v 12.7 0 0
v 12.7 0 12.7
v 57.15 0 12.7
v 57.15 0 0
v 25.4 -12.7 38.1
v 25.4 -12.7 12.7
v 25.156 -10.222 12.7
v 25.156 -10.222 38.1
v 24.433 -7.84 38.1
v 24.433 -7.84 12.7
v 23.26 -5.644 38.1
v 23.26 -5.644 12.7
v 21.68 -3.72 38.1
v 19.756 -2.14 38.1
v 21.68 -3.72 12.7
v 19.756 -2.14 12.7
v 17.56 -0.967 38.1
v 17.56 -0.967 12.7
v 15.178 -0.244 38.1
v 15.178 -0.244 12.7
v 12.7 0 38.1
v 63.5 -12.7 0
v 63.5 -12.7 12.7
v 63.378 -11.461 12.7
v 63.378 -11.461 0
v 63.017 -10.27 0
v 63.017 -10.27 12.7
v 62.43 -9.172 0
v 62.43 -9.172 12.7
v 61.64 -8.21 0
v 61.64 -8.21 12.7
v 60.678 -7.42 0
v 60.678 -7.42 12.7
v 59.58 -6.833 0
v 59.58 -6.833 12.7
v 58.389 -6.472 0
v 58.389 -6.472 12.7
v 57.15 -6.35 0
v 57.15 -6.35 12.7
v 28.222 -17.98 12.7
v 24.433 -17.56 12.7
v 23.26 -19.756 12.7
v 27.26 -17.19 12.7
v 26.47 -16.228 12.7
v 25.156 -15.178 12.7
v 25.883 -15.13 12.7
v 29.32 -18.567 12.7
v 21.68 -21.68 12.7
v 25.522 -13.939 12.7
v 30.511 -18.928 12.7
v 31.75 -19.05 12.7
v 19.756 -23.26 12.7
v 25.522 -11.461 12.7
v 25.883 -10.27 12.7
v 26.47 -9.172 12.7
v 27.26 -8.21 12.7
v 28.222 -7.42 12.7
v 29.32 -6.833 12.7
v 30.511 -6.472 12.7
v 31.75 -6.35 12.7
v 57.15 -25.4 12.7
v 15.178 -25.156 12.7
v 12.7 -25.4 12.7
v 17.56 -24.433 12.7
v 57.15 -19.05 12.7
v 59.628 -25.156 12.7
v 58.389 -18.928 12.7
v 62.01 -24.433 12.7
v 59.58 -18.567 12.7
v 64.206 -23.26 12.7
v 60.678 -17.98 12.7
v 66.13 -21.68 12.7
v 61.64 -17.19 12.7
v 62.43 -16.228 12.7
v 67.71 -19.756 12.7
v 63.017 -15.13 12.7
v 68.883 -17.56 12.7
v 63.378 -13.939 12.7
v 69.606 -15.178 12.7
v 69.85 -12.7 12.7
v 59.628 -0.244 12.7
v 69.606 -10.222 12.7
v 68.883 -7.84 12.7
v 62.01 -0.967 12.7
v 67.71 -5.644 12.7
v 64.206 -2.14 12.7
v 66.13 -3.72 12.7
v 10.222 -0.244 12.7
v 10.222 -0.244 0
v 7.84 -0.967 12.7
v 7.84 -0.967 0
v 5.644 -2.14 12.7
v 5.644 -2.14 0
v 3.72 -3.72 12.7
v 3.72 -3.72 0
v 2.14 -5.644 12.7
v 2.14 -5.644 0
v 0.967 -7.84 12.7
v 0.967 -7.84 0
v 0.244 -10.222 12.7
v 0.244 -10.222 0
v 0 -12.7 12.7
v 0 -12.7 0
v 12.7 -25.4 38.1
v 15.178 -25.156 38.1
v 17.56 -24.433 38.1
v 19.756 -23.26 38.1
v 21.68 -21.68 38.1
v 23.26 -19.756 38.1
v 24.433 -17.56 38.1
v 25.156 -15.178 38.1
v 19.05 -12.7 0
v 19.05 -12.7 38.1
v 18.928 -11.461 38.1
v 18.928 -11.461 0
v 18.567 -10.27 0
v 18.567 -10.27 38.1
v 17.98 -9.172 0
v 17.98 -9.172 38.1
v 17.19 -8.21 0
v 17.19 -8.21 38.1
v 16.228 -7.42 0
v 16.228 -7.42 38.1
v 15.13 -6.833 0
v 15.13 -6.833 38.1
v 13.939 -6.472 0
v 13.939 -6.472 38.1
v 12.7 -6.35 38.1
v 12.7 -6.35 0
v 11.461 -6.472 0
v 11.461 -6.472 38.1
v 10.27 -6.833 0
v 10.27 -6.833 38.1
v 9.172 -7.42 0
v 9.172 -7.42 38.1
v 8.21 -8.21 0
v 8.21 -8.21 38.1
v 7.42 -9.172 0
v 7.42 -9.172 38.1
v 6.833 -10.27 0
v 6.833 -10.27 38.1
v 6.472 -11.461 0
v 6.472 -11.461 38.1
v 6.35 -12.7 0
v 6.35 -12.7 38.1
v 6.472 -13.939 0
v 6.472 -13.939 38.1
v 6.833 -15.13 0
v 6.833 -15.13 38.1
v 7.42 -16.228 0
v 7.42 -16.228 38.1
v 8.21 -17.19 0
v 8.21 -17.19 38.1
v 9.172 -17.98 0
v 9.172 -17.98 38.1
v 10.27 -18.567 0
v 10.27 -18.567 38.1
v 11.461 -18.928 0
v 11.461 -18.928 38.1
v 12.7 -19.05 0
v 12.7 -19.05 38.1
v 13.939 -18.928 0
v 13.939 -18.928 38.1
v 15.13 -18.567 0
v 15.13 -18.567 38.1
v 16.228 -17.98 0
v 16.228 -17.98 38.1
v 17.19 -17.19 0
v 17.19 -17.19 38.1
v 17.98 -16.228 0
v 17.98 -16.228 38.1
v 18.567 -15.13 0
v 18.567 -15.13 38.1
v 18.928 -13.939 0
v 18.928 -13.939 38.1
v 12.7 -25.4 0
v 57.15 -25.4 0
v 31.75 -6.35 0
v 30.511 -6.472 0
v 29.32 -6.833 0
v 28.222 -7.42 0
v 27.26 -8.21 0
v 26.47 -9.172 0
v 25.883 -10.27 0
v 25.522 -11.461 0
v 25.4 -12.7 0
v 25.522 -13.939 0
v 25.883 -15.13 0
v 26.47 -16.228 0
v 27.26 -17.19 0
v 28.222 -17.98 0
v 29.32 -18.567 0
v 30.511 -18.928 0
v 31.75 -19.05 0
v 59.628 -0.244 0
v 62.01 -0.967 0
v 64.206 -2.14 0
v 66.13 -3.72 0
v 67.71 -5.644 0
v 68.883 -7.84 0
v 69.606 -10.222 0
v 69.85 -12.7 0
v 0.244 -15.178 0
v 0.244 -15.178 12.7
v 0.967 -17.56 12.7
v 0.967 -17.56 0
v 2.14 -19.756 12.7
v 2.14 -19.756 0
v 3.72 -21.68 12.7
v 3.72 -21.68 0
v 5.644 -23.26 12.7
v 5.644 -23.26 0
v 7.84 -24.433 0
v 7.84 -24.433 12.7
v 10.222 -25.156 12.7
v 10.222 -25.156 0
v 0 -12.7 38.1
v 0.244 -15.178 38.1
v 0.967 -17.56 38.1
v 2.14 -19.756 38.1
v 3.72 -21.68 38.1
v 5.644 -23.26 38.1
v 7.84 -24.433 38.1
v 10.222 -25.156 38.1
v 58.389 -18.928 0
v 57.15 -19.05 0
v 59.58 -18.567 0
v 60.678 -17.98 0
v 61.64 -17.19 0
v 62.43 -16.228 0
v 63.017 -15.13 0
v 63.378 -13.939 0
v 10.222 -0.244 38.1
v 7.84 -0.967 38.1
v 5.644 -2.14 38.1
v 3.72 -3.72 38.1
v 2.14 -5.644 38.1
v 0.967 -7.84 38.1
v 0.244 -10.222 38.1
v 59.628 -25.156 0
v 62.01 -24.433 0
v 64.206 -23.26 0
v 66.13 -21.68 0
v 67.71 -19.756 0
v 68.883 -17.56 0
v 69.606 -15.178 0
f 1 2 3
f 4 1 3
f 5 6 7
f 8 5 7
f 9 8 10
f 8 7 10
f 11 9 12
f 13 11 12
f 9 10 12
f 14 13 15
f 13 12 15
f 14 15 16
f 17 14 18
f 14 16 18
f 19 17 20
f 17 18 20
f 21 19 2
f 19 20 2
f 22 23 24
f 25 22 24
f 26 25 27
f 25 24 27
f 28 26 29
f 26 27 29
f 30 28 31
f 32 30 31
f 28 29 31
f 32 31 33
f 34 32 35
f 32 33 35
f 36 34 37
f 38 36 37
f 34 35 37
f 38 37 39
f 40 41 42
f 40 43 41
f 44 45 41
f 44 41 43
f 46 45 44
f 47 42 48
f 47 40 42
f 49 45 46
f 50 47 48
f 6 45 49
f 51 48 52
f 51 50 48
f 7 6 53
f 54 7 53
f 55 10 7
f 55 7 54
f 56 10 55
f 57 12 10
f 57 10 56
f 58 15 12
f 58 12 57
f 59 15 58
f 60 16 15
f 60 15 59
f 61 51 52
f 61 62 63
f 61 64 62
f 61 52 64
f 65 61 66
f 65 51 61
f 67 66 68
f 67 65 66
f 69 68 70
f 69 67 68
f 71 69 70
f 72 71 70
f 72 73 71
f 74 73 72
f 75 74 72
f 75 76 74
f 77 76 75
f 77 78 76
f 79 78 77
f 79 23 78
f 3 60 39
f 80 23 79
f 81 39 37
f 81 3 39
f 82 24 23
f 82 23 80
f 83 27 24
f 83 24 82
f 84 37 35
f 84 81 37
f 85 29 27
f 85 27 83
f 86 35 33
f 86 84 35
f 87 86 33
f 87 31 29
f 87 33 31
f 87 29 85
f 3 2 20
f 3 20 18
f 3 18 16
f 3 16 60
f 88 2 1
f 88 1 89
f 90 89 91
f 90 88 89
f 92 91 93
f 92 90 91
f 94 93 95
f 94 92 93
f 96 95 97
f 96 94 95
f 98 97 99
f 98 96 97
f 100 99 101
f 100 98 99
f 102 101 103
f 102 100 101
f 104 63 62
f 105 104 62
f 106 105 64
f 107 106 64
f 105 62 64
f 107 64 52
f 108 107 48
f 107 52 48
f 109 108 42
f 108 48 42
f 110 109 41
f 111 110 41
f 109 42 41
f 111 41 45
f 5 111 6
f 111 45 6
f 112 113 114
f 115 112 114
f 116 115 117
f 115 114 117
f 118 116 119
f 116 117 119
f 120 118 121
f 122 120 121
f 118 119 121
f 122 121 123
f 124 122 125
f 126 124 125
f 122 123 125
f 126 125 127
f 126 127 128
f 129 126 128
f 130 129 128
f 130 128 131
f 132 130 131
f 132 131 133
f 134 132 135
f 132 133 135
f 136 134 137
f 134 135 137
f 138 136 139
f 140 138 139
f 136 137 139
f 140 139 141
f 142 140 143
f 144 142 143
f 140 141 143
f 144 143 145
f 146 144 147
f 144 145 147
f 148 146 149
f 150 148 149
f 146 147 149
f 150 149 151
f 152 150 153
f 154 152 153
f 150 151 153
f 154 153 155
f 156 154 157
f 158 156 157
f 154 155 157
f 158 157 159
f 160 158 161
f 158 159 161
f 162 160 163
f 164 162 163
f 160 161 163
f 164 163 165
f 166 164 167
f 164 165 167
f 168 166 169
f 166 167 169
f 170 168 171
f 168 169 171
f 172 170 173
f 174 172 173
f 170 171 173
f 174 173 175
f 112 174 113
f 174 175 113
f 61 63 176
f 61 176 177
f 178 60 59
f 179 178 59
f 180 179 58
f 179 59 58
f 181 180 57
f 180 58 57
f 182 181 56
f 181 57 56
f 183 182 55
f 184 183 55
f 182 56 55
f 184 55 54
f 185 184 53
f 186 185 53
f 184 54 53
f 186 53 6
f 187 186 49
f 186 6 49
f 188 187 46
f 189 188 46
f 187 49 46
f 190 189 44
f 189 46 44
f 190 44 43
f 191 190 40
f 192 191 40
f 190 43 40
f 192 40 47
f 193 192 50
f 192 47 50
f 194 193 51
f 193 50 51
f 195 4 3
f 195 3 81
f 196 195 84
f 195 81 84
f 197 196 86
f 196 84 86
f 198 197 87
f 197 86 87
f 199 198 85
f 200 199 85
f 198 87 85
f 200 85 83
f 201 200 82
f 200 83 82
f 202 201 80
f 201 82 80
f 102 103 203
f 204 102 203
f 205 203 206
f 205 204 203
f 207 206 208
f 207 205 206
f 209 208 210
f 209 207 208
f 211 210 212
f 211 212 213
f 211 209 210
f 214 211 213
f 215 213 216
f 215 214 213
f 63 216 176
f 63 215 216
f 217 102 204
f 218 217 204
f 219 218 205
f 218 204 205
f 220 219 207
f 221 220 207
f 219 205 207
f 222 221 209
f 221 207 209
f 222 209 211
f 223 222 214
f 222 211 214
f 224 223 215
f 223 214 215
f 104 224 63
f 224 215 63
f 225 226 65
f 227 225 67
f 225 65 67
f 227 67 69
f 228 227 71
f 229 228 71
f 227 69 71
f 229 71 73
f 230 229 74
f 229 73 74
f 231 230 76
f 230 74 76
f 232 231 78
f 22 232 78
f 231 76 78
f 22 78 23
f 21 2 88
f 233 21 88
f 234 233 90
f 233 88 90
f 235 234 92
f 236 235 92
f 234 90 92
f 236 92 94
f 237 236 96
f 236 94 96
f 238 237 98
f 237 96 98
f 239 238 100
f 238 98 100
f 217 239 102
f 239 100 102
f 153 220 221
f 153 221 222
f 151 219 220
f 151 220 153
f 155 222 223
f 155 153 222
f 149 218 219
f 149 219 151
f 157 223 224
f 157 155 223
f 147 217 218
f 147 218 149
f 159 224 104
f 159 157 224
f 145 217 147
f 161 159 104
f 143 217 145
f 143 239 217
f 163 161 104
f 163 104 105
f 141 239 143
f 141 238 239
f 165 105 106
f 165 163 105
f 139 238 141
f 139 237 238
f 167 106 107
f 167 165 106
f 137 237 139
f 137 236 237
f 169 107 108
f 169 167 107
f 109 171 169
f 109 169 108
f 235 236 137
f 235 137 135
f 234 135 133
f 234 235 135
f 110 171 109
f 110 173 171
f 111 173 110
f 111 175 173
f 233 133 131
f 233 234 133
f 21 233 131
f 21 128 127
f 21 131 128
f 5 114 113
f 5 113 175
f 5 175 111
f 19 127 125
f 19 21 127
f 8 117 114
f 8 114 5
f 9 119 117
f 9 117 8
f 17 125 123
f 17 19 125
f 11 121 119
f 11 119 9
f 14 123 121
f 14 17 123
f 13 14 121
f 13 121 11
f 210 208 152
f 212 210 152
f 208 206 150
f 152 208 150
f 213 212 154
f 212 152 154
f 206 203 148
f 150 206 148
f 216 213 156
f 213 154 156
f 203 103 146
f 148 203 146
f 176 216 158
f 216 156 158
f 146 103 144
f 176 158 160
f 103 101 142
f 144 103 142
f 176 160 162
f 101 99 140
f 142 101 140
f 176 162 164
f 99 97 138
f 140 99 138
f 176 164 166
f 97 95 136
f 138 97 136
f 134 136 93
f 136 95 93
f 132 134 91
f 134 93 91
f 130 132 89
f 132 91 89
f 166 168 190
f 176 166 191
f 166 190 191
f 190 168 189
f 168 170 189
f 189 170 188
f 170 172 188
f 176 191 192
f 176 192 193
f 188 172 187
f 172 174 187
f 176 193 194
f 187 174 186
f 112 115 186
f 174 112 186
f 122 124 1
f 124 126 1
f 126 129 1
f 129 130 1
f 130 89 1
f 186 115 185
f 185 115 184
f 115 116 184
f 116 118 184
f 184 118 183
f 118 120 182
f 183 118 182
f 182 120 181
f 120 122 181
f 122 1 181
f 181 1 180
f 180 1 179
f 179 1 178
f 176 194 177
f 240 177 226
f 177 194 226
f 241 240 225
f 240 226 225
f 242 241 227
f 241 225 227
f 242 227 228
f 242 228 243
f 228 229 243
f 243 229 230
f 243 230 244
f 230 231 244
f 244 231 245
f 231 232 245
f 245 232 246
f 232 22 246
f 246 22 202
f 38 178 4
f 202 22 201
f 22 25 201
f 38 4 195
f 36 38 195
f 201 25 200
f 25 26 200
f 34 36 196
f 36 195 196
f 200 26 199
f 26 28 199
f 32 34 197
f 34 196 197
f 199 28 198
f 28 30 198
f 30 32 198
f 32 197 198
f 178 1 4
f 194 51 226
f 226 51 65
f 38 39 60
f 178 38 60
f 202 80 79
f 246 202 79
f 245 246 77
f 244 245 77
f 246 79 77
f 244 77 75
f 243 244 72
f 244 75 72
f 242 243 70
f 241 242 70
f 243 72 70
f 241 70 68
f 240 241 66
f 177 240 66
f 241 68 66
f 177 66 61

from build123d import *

# Parameters (mm, degrees)
F0_W      = 69.85
F0_H      = 12.7
F1_DEPTH  = 25.4
F3_DEPTH  = 12.7
F5_DEPTH  = 25.4
F6_DEPTH  = 12.7
F7_R      = 6.35
F8_DEPTH  = 38.1
F10_DEPTH = 12.7


with BuildPart() as f1:
    # F0 (on Front) → F1 (new body)
    with BuildSketch(Plane.XZ):
        with Locations((34.925, 6.35)):
            Rectangle(F0_W, F0_H)
    extrude(amount=F1_DEPTH)

    # F2 (on face) → F3 (cut)
    with BuildSketch(Plane.XY.offset(12.7)):
        with BuildLine():
            ThreePointArc((38.1, -12.7), (36.2401280605, -8.2098719395), (31.75, -6.35))
            ThreePointArc((31.75, -6.35), (25.4, -12.7), (31.75, -19.05))
            ThreePointArc((31.75, -19.05), (36.2401280605, -17.1901280605), (38.1, -12.7))
        make_face()
        with BuildLine():
            ThreePointArc((57.15, -19.05), (50.8, -12.7), (57.15, -6.35))
            Line((57.15, -6.35), (31.75, -6.35))
            ThreePointArc((31.75, -6.35), (36.2401280605, -8.2098719395), (38.1, -12.7))
            ThreePointArc((38.1, -12.7), (36.2401280605, -17.1901280605), (31.75, -19.05))
            Line((31.75, -19.05), (57.15, -19.05))
        make_face()
        with BuildLine():
            ThreePointArc((57.15, -19.05), (61.6401280605, -17.1901280605), (63.5, -12.7))
            ThreePointArc((63.5, -12.7), (61.6401280605, -8.2098719395), (57.15, -6.35))
            ThreePointArc((57.15, -6.35), (50.8, -12.7), (57.15, -19.05))
        make_face()
    extrude(amount=-F3_DEPTH, mode=Mode.SUBTRACT)

    # F4 (on face) → F5 (join)
    with BuildSketch(Plane.XY.offset(12.7)):
        with BuildLine():
            ThreePointArc((12.7, -25.4), (21.6802561211, -21.6802561211), (25.4, -12.7))
            ThreePointArc((25.4, -12.7), (21.6802561211, -3.7197438789), (12.7, 0))
            ThreePointArc((12.7, 0), (3.7197438789, -3.7197438789), (0, -12.7))
            ThreePointArc((0, -12.7), (3.7197438789, -21.6802561211), (12.7, -25.4))
        make_face()
    extrude(amount=F5_DEPTH)

    # F6 (cut): faces of the model
    f6_faces = [f1.faces().sort_by_distance(p)[0] for p in [
        (2.8367728246, -2.8367728246, 12.7),
        (2.8367728246, -22.5632271754, 12.7),
    ]]
    extrude(f6_faces, amount=-F6_DEPTH, mode=Mode.SUBTRACT)

    # F7 (on face) → F8 (cut)
    with BuildSketch(Plane.XY.offset(38.1)):
        with Locations((12.7, -12.7)):
            Circle(F7_R)
    extrude(amount=-F8_DEPTH, mode=Mode.SUBTRACT)

    # F9 (on face) → F10 (cut)
    with BuildSketch(Plane.XY.offset(12.7)):
        with BuildLine():
            ThreePointArc((57.15, 0), (66.1302561211, -3.7197438789), (69.85, -12.7))
            Line((69.85, -12.7), (69.85, 0))
            Line((69.85, 0), (57.15, 0))
        make_face()
        with BuildLine():
            ThreePointArc((69.85, -12.7), (66.1302561211, -21.6802561211), (57.15, -25.4))
            Line((57.15, -25.4), (69.85, -25.4))
            Line((69.85, -25.4), (69.85, -12.7))
        make_face()
    extrude(amount=-F10_DEPTH, mode=Mode.SUBTRACT)


solid = f1.part
